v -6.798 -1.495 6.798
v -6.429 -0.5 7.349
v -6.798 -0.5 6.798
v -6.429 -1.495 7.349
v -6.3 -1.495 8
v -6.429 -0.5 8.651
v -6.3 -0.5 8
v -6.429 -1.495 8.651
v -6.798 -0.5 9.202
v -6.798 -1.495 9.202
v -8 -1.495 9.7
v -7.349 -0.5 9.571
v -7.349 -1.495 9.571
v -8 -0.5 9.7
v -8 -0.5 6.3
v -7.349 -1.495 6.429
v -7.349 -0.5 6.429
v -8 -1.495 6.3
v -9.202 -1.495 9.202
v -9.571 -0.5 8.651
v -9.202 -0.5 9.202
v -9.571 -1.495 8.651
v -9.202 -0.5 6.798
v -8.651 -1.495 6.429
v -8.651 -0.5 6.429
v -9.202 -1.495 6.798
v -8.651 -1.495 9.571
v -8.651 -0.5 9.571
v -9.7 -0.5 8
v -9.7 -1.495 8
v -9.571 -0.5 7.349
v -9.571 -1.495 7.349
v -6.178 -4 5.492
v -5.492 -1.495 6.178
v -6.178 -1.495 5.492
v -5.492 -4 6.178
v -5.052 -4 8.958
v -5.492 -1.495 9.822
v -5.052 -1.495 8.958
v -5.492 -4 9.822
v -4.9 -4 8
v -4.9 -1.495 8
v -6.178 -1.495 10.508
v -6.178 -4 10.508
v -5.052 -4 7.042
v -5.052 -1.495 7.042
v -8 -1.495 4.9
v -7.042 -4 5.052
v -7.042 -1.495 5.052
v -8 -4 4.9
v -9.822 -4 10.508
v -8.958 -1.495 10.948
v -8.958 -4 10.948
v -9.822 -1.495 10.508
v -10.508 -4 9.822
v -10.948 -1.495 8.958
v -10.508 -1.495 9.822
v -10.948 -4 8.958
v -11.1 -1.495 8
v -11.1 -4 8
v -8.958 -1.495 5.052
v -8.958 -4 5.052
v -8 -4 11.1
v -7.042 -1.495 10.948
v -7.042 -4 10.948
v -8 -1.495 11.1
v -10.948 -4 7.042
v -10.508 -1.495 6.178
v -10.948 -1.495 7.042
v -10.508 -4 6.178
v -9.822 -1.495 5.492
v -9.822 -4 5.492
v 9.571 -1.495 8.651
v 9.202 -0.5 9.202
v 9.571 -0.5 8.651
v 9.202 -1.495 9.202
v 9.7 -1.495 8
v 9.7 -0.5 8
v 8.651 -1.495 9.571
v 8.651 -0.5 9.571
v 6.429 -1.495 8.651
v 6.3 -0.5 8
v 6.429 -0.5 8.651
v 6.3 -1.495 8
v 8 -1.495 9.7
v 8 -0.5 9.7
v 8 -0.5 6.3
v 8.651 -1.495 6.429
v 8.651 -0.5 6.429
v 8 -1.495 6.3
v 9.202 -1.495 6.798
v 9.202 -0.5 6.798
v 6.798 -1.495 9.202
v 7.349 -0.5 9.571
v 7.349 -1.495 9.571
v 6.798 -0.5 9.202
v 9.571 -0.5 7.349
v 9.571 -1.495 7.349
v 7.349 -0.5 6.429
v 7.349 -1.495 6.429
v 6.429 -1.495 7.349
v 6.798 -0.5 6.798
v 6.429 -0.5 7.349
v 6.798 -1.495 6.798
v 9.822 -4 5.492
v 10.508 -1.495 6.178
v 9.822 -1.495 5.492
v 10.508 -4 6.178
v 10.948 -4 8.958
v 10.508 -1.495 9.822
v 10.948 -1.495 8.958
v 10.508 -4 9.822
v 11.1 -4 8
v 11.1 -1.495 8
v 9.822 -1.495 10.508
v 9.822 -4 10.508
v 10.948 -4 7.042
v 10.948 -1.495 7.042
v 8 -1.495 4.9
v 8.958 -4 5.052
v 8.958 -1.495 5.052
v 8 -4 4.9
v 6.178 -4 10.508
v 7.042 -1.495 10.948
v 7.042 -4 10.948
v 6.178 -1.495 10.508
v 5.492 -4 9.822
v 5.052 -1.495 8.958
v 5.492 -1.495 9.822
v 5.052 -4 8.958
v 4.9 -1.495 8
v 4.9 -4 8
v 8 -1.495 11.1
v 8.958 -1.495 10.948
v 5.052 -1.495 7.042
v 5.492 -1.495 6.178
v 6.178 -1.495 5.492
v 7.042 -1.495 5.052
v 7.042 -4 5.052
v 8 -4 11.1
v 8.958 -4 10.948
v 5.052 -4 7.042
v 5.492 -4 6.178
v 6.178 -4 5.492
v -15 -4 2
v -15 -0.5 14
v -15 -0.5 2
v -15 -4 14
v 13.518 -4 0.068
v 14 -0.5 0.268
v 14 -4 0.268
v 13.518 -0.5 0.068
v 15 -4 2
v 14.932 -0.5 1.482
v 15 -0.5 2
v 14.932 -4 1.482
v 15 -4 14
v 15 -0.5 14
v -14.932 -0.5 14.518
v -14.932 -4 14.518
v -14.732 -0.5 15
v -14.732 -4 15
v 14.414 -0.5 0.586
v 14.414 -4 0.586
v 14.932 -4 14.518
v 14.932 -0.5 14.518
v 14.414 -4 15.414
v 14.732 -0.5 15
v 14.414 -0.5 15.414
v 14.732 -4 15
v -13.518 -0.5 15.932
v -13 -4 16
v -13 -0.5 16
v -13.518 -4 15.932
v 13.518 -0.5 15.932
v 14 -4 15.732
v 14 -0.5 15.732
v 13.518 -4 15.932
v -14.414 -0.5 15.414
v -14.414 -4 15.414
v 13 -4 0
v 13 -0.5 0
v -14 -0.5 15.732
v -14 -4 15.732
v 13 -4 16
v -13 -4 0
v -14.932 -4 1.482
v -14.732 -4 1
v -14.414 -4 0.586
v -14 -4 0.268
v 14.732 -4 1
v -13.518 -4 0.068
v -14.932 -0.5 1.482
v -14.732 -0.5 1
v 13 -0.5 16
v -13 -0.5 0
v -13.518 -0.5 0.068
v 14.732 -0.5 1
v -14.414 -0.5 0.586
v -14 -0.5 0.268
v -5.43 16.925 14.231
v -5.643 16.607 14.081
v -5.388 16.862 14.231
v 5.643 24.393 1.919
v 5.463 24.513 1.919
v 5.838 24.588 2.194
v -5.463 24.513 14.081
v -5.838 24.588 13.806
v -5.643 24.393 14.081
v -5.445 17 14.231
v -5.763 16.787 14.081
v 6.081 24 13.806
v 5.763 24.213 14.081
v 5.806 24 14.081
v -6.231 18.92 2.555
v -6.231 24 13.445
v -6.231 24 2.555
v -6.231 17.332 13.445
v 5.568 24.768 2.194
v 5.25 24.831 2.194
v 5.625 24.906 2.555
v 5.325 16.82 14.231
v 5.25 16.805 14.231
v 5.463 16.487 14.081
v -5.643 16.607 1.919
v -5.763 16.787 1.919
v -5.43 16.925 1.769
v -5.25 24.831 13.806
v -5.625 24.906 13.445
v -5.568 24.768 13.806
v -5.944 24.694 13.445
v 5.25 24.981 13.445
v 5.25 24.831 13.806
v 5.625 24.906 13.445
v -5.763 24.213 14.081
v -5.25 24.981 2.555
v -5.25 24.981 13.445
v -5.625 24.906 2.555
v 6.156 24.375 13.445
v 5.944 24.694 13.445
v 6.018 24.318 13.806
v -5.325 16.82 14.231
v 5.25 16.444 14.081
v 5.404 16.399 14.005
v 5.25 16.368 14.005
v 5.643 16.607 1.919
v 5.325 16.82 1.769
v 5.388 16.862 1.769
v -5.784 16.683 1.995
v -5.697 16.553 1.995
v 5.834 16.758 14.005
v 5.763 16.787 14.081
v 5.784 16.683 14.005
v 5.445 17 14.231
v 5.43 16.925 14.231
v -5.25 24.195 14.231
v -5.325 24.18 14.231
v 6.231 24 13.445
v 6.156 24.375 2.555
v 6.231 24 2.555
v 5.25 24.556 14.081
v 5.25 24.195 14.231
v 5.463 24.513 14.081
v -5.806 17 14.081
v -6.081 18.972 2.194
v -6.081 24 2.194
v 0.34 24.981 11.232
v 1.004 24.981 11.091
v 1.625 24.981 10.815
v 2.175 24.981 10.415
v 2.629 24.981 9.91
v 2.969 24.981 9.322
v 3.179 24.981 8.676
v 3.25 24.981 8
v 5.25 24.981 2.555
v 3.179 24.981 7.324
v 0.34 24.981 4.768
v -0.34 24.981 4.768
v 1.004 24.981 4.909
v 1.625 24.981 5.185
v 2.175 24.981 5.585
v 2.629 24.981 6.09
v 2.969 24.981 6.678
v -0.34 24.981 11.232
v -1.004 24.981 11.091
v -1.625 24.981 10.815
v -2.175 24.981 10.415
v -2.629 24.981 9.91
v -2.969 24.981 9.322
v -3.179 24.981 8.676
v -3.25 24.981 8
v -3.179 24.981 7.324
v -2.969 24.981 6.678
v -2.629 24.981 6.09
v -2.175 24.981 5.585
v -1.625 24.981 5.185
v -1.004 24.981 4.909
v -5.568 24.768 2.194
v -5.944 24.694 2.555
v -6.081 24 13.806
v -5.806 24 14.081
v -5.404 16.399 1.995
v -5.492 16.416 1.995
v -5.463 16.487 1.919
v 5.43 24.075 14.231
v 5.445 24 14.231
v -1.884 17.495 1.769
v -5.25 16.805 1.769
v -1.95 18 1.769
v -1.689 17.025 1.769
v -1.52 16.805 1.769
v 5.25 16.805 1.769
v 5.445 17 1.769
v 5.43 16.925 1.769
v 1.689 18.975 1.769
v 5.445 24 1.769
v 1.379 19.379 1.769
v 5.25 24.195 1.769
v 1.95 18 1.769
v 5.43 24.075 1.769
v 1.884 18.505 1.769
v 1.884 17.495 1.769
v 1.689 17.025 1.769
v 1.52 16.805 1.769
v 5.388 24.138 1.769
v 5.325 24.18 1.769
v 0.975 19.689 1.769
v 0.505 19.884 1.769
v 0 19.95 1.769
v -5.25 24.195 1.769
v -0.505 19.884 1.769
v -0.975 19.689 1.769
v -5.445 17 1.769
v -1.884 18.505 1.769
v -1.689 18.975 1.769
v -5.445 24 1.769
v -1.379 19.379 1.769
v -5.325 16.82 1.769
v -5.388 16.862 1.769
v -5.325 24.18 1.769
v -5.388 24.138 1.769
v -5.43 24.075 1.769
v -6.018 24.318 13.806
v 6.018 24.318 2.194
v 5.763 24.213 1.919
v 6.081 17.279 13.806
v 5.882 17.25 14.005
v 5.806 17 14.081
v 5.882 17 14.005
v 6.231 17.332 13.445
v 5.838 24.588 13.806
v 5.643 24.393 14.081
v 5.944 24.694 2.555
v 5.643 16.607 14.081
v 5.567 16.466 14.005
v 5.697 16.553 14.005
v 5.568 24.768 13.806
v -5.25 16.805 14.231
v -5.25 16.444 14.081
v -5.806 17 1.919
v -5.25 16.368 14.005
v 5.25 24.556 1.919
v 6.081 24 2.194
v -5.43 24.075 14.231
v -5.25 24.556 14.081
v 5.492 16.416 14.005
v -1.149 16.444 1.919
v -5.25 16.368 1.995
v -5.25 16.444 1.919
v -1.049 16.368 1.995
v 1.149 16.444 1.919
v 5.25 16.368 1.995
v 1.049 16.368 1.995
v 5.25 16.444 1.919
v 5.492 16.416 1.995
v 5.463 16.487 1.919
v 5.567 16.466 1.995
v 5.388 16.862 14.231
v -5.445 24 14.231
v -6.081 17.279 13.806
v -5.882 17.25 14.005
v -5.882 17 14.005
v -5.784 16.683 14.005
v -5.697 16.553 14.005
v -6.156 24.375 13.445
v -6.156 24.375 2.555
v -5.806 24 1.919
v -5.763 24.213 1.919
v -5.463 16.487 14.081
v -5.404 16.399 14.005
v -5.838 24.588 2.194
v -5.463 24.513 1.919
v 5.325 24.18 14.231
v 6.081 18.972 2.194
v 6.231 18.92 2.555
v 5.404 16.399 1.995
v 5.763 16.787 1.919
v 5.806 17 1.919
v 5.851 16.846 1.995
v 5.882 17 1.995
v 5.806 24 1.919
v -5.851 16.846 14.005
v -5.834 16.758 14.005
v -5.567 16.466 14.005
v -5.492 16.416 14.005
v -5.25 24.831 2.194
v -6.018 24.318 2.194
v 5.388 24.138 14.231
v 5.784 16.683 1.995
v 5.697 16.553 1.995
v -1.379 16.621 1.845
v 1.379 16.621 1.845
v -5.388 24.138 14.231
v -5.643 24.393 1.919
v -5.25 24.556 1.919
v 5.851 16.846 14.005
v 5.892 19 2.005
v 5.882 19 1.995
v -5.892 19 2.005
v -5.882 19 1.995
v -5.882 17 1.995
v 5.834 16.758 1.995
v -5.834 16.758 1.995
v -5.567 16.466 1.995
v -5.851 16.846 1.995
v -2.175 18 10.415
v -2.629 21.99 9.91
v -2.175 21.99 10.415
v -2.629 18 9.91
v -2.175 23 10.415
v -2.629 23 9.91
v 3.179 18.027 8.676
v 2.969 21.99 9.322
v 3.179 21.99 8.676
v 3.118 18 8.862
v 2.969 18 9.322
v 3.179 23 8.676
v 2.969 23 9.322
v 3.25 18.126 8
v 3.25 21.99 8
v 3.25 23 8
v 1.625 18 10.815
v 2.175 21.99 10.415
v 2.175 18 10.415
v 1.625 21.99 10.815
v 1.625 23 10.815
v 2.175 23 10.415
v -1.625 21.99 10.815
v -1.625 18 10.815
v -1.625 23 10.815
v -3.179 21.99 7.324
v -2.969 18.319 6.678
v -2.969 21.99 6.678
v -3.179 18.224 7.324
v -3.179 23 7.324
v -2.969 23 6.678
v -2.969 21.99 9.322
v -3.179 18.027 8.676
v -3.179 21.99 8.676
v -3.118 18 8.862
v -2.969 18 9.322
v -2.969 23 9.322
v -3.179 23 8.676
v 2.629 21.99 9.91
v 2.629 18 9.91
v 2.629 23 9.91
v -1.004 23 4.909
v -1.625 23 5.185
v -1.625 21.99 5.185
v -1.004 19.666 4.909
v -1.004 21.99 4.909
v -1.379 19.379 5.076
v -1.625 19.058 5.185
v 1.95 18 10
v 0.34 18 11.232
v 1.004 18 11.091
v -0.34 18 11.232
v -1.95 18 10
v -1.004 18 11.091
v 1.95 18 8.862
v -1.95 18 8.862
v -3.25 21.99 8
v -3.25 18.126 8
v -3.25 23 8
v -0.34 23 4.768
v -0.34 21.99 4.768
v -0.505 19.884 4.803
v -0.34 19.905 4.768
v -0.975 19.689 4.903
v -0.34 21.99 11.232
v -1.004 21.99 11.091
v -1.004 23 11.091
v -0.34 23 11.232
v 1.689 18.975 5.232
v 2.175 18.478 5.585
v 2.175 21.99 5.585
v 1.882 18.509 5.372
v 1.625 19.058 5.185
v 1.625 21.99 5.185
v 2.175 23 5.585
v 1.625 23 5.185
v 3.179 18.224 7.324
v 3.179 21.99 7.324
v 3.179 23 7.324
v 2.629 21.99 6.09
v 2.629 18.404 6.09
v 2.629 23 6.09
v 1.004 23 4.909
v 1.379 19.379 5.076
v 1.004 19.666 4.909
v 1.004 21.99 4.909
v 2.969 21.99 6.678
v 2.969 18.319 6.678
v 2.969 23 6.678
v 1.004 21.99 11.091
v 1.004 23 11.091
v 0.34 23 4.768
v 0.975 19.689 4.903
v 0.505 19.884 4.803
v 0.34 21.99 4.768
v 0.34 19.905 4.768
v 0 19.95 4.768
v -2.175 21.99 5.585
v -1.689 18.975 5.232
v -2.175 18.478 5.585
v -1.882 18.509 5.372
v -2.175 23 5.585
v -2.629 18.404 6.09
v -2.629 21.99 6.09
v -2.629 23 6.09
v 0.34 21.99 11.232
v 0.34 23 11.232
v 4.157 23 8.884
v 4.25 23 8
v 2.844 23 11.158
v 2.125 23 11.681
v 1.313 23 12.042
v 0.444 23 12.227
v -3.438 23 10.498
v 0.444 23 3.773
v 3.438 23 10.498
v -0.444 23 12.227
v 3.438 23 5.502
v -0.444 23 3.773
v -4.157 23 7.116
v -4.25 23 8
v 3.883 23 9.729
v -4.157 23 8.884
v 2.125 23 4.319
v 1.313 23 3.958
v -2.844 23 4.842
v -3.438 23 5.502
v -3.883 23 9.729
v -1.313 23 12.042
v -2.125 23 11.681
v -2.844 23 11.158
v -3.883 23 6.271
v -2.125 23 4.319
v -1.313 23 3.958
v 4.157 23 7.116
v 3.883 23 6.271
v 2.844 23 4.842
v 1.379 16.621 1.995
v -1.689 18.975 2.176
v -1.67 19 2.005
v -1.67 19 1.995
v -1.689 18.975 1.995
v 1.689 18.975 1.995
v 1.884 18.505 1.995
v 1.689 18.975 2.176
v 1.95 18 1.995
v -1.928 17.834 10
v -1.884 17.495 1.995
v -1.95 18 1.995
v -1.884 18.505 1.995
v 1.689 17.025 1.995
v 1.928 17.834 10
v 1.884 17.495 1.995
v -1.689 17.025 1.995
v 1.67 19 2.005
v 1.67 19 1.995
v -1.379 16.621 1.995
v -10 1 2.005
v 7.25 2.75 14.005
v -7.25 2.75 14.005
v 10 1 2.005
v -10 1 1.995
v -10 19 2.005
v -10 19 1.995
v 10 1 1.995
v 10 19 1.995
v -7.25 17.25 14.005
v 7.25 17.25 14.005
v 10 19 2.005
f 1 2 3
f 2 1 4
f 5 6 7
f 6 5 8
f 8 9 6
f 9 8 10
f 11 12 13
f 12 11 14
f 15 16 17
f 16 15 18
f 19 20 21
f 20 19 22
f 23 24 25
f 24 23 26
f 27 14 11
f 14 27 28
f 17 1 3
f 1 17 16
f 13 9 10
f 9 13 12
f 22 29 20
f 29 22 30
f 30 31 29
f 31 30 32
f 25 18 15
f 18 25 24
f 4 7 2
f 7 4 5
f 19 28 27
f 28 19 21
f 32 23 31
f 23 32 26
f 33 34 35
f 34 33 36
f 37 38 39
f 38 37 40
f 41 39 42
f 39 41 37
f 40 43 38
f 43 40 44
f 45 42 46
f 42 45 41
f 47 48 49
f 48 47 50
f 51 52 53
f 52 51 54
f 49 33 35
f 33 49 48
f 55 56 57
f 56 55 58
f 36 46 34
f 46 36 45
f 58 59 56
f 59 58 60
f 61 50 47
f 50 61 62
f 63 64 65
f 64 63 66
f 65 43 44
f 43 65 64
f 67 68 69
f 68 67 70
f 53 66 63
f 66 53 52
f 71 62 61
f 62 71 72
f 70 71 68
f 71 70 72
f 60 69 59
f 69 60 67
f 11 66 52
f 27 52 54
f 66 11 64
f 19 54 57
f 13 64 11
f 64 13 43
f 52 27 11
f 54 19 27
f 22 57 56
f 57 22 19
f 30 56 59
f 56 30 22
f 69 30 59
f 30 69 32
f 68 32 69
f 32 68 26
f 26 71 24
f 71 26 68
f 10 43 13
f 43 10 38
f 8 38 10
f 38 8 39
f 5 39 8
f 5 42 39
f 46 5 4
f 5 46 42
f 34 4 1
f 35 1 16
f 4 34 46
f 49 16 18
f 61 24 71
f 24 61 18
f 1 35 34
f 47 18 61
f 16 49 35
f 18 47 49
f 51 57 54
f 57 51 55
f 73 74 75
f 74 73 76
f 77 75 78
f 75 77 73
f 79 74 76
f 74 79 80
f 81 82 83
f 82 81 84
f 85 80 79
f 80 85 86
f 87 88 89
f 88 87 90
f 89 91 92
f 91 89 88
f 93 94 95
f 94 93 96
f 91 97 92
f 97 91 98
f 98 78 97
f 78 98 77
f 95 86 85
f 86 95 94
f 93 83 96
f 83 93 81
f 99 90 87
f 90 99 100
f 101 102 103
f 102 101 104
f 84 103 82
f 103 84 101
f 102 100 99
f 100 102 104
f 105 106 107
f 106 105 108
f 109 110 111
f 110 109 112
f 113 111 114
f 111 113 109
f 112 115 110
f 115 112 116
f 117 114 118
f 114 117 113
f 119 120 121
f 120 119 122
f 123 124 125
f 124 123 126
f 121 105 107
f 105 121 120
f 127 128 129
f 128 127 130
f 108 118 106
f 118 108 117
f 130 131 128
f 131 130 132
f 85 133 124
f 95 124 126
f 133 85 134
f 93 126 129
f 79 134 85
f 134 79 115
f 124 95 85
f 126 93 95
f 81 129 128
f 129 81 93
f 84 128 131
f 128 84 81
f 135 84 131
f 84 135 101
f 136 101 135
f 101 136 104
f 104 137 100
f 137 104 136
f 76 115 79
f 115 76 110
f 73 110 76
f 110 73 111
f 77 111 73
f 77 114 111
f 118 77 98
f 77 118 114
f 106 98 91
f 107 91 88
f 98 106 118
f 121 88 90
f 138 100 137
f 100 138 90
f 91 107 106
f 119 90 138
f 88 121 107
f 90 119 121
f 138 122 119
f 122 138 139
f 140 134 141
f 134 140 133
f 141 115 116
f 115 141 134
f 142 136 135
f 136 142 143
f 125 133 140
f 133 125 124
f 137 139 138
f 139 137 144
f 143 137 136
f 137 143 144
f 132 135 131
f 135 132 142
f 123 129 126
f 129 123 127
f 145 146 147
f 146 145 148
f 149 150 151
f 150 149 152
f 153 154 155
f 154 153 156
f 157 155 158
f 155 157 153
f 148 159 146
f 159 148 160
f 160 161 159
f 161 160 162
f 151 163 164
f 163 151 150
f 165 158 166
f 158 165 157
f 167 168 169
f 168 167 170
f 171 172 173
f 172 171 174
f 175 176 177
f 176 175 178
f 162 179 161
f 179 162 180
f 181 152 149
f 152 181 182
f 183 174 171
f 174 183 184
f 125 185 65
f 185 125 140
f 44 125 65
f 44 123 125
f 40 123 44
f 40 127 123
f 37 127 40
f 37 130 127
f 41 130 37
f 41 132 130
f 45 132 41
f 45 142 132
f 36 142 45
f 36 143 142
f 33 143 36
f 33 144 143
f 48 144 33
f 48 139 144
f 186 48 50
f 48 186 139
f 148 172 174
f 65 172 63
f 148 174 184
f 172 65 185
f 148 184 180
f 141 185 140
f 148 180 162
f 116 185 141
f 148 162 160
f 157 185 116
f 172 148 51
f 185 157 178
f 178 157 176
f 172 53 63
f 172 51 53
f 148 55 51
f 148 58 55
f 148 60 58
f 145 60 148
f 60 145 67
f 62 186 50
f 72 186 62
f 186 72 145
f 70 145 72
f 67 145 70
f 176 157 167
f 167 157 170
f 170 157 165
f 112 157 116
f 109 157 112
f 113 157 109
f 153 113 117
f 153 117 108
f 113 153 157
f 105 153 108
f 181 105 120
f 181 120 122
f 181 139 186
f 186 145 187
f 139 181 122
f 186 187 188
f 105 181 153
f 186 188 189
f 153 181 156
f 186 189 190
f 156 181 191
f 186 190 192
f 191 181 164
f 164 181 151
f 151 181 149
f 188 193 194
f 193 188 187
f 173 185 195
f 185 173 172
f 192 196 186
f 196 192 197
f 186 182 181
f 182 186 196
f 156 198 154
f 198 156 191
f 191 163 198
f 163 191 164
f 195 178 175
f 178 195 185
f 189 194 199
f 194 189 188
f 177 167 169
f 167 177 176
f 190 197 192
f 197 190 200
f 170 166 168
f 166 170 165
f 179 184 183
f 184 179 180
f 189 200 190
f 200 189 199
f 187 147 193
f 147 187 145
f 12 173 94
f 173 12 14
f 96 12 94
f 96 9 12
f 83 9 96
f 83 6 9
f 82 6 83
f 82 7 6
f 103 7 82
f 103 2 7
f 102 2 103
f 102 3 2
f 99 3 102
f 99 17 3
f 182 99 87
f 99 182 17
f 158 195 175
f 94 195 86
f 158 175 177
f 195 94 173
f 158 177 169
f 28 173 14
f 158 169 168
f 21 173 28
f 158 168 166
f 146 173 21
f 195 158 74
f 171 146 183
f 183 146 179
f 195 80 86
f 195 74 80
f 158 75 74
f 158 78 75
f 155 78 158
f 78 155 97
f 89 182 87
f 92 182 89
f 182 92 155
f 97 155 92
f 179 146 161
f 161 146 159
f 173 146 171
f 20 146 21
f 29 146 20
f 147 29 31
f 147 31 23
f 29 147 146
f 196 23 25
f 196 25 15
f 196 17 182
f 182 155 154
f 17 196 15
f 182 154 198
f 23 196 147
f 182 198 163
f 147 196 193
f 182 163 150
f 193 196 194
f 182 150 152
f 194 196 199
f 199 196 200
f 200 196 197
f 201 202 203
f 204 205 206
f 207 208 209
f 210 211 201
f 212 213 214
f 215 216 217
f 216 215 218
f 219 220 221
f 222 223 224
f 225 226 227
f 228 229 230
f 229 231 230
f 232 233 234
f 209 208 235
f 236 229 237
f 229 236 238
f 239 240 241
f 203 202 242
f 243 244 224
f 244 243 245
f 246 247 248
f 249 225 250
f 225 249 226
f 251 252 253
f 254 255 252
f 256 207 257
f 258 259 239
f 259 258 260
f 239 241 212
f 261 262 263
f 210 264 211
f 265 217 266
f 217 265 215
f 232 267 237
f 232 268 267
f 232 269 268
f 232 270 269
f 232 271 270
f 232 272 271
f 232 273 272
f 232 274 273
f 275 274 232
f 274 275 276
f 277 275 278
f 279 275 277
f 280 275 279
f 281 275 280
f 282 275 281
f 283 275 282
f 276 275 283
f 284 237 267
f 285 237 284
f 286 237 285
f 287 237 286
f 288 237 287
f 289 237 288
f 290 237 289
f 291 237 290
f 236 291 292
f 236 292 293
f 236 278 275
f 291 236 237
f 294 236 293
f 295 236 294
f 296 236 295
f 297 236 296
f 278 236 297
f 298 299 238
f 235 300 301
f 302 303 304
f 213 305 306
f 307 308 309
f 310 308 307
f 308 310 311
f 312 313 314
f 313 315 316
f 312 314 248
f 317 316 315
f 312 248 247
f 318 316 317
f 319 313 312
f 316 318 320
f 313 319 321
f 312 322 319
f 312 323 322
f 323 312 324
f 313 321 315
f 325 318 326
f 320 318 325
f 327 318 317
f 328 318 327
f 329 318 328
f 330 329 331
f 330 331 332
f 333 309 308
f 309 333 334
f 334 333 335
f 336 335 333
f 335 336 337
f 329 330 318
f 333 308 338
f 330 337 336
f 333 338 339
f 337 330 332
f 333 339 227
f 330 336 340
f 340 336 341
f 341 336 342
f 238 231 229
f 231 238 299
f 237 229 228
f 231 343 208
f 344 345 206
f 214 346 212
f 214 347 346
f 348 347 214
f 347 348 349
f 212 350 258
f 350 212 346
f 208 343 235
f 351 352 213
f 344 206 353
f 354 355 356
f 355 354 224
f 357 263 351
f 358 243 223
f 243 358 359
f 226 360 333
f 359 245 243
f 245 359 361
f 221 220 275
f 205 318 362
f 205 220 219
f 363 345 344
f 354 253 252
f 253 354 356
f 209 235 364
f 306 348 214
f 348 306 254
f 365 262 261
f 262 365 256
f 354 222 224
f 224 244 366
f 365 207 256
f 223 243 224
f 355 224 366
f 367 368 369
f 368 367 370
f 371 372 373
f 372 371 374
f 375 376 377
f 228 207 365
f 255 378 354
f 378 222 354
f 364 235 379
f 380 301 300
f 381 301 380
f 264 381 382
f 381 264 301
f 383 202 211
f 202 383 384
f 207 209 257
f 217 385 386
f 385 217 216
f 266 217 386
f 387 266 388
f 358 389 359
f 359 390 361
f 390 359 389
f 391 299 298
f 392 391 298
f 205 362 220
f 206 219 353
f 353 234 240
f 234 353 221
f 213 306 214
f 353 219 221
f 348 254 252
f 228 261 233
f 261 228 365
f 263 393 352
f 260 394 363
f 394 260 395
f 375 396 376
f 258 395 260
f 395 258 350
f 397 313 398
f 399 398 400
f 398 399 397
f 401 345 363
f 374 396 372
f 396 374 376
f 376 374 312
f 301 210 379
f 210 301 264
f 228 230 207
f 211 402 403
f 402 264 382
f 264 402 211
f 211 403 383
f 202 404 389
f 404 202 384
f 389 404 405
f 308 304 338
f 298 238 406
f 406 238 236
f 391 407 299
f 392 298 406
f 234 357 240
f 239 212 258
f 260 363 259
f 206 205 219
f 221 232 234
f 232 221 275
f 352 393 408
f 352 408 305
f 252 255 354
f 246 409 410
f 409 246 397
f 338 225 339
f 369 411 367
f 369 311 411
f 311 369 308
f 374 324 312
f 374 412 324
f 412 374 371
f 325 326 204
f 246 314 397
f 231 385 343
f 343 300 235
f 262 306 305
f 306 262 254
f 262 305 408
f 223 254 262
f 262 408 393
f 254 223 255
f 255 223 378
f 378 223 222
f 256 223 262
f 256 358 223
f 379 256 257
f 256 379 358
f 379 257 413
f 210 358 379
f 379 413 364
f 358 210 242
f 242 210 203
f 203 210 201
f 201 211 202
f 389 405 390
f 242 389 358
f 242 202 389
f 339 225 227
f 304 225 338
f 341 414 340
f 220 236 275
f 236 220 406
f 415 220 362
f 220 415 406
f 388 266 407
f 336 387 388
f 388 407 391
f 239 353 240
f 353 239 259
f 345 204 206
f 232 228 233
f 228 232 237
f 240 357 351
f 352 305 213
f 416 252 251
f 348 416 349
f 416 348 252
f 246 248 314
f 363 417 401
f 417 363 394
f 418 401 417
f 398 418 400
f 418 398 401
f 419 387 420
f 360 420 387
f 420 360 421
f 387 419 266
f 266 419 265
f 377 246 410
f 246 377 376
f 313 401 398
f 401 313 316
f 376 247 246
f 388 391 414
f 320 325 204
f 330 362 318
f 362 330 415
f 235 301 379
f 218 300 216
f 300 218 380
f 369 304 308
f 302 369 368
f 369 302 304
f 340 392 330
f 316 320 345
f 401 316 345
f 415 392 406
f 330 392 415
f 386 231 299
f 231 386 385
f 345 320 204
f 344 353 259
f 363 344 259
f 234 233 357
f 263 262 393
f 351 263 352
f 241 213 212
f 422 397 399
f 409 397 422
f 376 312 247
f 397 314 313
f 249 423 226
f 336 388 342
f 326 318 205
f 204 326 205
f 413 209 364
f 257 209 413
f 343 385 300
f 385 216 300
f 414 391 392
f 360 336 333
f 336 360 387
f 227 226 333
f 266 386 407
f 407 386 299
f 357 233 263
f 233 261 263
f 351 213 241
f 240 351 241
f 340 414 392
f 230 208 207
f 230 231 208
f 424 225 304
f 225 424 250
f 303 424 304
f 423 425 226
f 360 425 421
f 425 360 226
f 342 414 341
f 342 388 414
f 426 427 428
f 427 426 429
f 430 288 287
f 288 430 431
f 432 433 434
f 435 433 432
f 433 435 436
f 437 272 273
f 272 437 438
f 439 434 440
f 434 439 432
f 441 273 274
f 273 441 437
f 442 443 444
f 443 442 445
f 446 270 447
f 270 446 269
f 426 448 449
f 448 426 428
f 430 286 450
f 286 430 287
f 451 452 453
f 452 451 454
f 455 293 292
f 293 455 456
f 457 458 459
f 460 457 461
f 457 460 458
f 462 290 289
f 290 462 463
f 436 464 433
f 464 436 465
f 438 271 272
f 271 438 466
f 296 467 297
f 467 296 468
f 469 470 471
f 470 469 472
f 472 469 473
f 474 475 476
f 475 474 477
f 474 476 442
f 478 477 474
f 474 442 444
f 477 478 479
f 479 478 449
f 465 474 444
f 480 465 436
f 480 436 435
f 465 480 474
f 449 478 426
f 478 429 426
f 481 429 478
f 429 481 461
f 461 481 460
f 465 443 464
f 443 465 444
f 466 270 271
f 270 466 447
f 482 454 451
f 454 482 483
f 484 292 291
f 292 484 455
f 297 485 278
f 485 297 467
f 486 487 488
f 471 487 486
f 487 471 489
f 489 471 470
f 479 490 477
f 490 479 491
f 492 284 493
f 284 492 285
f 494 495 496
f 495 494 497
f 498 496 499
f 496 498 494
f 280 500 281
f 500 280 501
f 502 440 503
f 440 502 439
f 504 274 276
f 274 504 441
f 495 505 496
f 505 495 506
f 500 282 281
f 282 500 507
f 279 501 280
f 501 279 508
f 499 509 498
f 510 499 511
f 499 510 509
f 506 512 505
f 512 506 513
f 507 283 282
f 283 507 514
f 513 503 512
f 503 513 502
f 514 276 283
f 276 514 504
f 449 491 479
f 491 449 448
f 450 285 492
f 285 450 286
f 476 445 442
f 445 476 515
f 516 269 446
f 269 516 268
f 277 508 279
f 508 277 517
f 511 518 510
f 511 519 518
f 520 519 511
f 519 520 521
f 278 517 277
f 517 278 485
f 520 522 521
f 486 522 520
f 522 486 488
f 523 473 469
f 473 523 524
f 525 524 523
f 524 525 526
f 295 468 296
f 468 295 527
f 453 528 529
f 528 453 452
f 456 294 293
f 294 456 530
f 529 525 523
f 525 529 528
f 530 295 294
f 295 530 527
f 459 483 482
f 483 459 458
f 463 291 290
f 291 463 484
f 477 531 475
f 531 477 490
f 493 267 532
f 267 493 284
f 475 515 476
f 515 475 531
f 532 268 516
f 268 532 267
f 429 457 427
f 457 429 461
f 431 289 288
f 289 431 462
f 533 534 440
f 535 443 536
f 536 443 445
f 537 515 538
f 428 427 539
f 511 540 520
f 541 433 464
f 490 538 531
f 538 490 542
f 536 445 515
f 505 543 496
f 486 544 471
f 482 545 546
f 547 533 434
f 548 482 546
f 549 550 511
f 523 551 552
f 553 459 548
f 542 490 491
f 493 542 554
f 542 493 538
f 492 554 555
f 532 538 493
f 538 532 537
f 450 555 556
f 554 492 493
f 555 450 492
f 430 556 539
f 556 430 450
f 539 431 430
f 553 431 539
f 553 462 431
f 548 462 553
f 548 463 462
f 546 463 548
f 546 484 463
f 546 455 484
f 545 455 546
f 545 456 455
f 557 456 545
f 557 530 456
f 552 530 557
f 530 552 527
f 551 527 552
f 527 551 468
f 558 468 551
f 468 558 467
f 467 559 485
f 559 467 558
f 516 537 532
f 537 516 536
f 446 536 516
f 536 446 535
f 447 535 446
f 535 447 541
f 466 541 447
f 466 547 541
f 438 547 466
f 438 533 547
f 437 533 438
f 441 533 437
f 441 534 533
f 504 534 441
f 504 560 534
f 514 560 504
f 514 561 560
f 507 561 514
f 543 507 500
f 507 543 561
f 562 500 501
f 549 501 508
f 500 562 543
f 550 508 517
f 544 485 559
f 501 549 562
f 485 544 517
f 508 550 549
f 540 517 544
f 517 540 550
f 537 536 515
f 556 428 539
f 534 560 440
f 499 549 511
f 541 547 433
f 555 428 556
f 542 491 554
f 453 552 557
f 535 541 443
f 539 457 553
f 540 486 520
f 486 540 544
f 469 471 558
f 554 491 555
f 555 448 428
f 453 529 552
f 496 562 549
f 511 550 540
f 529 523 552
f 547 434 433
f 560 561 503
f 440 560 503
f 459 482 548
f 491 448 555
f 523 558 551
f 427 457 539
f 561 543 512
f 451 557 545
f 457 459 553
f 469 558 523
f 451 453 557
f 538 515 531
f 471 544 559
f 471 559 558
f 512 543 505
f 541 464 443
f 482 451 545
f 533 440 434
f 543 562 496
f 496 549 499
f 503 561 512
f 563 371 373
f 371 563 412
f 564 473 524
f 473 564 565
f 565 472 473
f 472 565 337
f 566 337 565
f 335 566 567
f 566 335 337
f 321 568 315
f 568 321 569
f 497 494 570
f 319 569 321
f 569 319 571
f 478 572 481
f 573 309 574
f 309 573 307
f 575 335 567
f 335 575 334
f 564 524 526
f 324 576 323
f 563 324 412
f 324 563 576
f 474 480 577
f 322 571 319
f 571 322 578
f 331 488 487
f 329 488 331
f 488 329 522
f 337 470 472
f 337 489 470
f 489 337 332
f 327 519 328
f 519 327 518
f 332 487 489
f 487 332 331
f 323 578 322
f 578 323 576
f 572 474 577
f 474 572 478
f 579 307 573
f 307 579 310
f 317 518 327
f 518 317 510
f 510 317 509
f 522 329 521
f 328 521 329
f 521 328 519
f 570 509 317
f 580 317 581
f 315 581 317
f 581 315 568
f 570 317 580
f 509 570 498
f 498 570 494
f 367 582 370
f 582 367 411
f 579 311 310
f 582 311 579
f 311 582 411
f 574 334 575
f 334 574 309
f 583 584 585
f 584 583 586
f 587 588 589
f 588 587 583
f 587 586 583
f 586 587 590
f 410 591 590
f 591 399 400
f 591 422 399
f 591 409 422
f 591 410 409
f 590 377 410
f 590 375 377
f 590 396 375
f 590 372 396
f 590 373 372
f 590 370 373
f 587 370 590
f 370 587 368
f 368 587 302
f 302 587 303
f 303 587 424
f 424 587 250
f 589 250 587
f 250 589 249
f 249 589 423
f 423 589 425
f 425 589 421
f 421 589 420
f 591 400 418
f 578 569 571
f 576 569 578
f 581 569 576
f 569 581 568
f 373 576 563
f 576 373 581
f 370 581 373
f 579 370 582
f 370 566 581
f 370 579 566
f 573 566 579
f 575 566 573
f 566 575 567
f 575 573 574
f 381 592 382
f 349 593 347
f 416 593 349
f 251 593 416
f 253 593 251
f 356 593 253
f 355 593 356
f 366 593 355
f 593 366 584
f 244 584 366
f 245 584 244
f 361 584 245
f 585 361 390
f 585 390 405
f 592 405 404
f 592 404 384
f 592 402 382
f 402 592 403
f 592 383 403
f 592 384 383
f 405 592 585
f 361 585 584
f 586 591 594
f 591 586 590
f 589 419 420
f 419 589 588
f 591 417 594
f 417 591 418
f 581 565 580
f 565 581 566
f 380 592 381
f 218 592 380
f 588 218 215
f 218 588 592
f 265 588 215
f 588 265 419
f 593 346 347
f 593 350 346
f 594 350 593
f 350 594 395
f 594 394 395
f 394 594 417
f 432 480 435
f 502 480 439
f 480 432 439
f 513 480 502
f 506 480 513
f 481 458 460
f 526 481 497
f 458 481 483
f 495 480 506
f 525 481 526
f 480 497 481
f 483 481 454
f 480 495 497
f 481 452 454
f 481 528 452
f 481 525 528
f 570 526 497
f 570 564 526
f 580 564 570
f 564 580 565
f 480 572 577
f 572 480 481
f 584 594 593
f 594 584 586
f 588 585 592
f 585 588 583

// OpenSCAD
// ============================================================
//  TPU Doctor Blade Holder — Luer Lock Blunt Tip (18G)
//  For: Rister Toolchanger / printed electronics BIPV fab
//  Material: TPU 85A–95A, 0.4 mm nozzle recommended
//  Author: HTS Resources LLC
// ============================================================
//
//  OVERVIEW
//  --------
//  This tool holds an 18G (or similar) Luer Lock blunt tip and
//  carries a flexible TPU doctor blade immediately behind the
//  nozzle exit. The blade spreads dispensed ink into a thin,
//  uniform film on the substrate. Z-height of the printer
//  toolhead controls the working gap (target 100–300 µm).
//
//  The body is split into three functional zones:
//    1. MOUNT PLATE  — attaches to tool head via M3 screws
//    2. BODY BRIDGE  — connects mount to nozzle collar; adds
//                      lateral stiffness while TPU stays flexible
//    3. NOZZLE COLLAR — snug friction fit for Luer Lock hub
//    4. BLADE WING   — thin tapered blade, 30 mm wide, flexible
//
//  PRINT SETTINGS (TPU 85A–95A)
//    - Layer height: 0.15–0.2 mm
//    - Perimeters: 3–4 walls
//    - Infill: 20–30% gyroid
//    - Print slow: 20–25 mm/s for TPU
//    - No supports needed if printed in orientation shown
//    - Orient flat (mount plate face-down on bed)
// ============================================================

/* ── GLOBAL PARAMETERS ── */

// Luer Lock hub outer diameter (18G Treela tip hub ≈ 6.5 mm)
// Increase slightly (e.g. 6.6) for tighter friction fit in TPU
luer_od = 6.5;          // mm — hub OD to grip
luer_depth = 7.0;       // mm — depth of collar socket
collar_wall = 2.0;      // mm — wall thickness around Luer hub
// Tip of collar has a chamfer to guide the Luer hub in
collar_chamfer = 1.0;   // mm

/* ── BLADE PARAMETERS ── */

blade_width     = 30.0; // mm — spreading width of doctor blade
blade_root_t    = 2.5;  // mm — thickness at blade root (stiff)
blade_tip_t     = 0.7;  // mm — thickness at blade edge (flexible)
blade_length    = 14.0; // mm — how far blade extends from nozzle CL
// The blade tapers linearly from root to tip in thickness
// blade_tip_t should be at or below 1 layer × number-of-walls
// for maximum flexibility at the spreading edge

/* ── BODY / BRIDGE PARAMETERS ── */

body_width  = 20.0;  // mm — width of central body (X)
body_depth  = 12.0;  // mm — depth front-to-back (Y)
body_height = 18.0;  // mm — height from mount plate to nozzle CL

/* ── MOUNT PLATE PARAMETERS ── */

mount_w   = 30.0;   // mm — total mount plate width
mount_h   = 16.0;   // mm — total mount plate height (Z axis)
mount_t   =  4.0;   // mm — plate thickness (Y axis, into tool head)
// M3 hole positions — measured from plate centre
m3_spacing_x = 16.0; // mm — horizontal distance between M3 holes
m3_spacing_z =  0.0; // mm — vertical offset (0 = same height)
m3_dia       =  3.4; // mm — M3 clearance hole (3.4 for TPU compression)
m3_head_dia  =  6.2; // mm — M3 countersink / washer recess diameter
m3_head_depth=  2.5; // mm — depth of washer recess

/* ── NOZZLE ALIGNMENT ── */

// Distance from front face of mount plate to nozzle CL (Y)
nozzle_reach   = body_depth + mount_t;
// Height of nozzle centre above bottom of mount plate (Z)
// Adjust this so the blade tip grazes the substrate at the
// desired Z=0 home when mount plate top is at tool head datum
nozzle_z_above_bottom = 8.0; // mm

/* ── DERIVED / CONVENIENCE ── */

collar_od  = luer_od + 2 * collar_wall;  // outer dia of collar
eps        = 0.01; // small epsilon for clean boolean diffs

// ============================================================
//  MODULES
// ============================================================

// --- 1. MOUNT PLATE -------------------------------------------
// Flat plate with M3 clearance holes and washer recesses.
// Attach this face to your tool head carriage.
module mount_plate() {
    difference() {
        // Main plate body — slightly radiused corners via minkowski
        minkowski() {
            cube([mount_w - 4, mount_h - 4, mount_t - 1], center=true);
            cylinder(r=2, h=0.5, $fn=24);
        }
        // Two M3 clearance holes
        for (dx = [-m3_spacing_x/2, m3_spacing_x/2]) {
            translate([dx, 0, m3_spacing_z]) {
                // Through hole
                cylinder(d=m3_dia, h=mount_t + eps*2, center=true, $fn=16);
                // Washer recess on back face
                translate([0, 0, (mount_t - m3_head_depth)/2])
                    cylinder(d=m3_head_dia, h=m3_head_depth + eps,
                             center=true, $fn=20);
            }
        }
    }
}

// --- 2. BODY BRIDGE -------------------------------------------
// Connects mount plate to nozzle collar.
// Rounded rectangular cross-section for stiffness + printability.
module body_bridge() {
    hull() {
        // At mount plate face
        translate([0, -body_depth/2, 0])
            cube([body_width, eps, body_height], center=true);
        // At nozzle collar face — narrower to blend into collar
        translate([0, body_depth/2, 0])
            cube([collar_od + 4, eps, collar_od + 4], center=true);
    }
}

// --- 3. NOZZLE COLLAR -----------------------------------------
// Cylindrical socket that accepts the Luer Lock hub.
// The front opening is chamfered to guide insertion.
// Inner diameter matches luer_od for a snug friction fit in TPU.
module nozzle_collar() {
    difference() {
        cylinder(d=collar_od, h=luer_depth, $fn=36);
        // Central bore for Luer hub
        translate([0, 0, collar_chamfer])
            cylinder(d=luer_od, h=luer_depth + eps, $fn=30);
        // Entry chamfer — makes it easy to push hub in
        translate([0, 0, -eps])
            cylinder(d1=luer_od + 2*collar_chamfer,
                     d2=luer_od,
                     h=collar_chamfer + eps, $fn=30);
    }
    // Hex grip ring around collar body (optional tactile feature)
    // Uncomment if you want a wrench-grip surface:
    // translate([0,0,luer_depth/2])
    //   rotate([0,0,0]) cylinder(d=collar_od+1, h=3, $fn=6, center=true);
}

// --- 4. DOCTOR BLADE ------------------------------------------
// Wide, thin blade that tapers from root_t to tip_t.
// Centred on X; positioned so root begins at nozzle CL (Y=0).
// The blade extends in the +Y direction (trailing behind nozzle
// as the head moves in -Y, i.e. blade drags the ink).
//
// TIP: For 85A TPU at blade_tip_t=0.7 mm, the edge is very
// flexible. Increase to 1.0 mm for stiffer 95A TPU.
module doctor_blade() {
    // Use a polyhedron for the tapered cross-section
    // Width = X, length = Y, thickness = Z (matches print orientation)
    w  = blade_width;
    l  = blade_length;
    rt = blade_root_t;
    tt = blade_tip_t;

    // 8-point polyhedron: trapezoidal cross-section (thicker at root)
    polyhedron(
        points = [
            // Root face (Y=0) — full thickness
            [-w/2,  0,  0],   // 0
            [ w/2,  0,  0],   // 1
            [ w/2,  0,  rt],  // 2
            [-w/2,  0,  rt],  // 3
            // Tip face (Y=+l) — thin edge, centred in Z at blade_root_t/2
            [-w/2,  l,  (rt-tt)/2],       // 4
            [ w/2,  l,  (rt-tt)/2],       // 5
            [ w/2,  l,  (rt-tt)/2 + tt],  // 6
            [-w/2,  l,  (rt-tt)/2 + tt],  // 7
        ],
        faces = [
            // All faces wound counter-clockwise when viewed from outside
            [3,2,1,0],   // root face (facing -Y)
            [4,5,6,7],   // tip face  (facing +Y)
            [3,7,4,0],   // left side  (facing -X)
            [0,4,5,1],   // bottom     (facing -Z)
            [1,5,6,2],   // right side (facing +X)
            [2,6,7,3],   // top        (facing +Z)
        ]
    );
}

// ============================================================
//  ASSEMBLY
// ============================================================
// Coordinate system:
//   X = left/right  (blade width direction)
//   Y = front/back  (travel direction; blade trails in +Y)
//   Z = up/down     (substrate gap direction; nozzle exits in -Z)
//
// Mount plate: back face at Y=0, extends in -Y into tool head.
// Nozzle collar: bore runs in Z, hub inserts from +Y (front face).
//   The nozzle tip exits downward (-Z) toward the substrate.
// Blade: root begins at nozzle CL (Y = nozzle_y), extends in +Y.
//   Blade edge in Z sits at substrate level; gap set by z_offset.
//
//  ┌──────────────────────────────────────┐
//  │  [mount plate]──[bridge]──[collar]   │  ← side view
//  │                             │        │
//  │                            ▼ nozzle  │
//  │                    [blade ══════════>│  trailing edge
//  └──────────────────────────────────────┘
//                       substrate ────────

// Y position of nozzle centreline (front face of bridge + collar radius)
nozzle_y = mount_t + body_depth;

module assembly() {
    // ----- MOUNT PLATE -----
    // Plate XZ plane, centred in X and Z, back face at Y=0
    translate([0, -mount_t/2, mount_h/2])
        rotate([90, 0, 0])
            mount_plate();

    // ----- BODY BRIDGE -----
    // Fills the gap between mount plate front face and collar
    translate([0, mount_t + body_depth/2, nozzle_z_above_bottom])
        rotate([90, 0, 0])
            body_bridge();

    // ----- NOZZLE COLLAR -----
    // Hub inserts from +Y (front face); nozzle exits downward (-Z).
    #translate([0, nozzle_y, nozzle_z_above_bottom])
        nozzle_collar_horizontal();

    // ----- DOCTOR BLADE -----
    // Root starts at nozzle_y (just behind nozzle exit).
    // Blade extends in +Y (trailing direction).
    // Z offset puts blade edge at substrate level.
    blade_z_offset = nozzle_z_above_bottom - blade_root_t;
    translate([0, nozzle_y, blade_z_offset])
    #    doctor_blade();
}

// Collar variant with bore running in Z and hub entry from +Y.
// The Luer hub slides in horizontally from the front; the nozzle
// tip points straight down toward the substrate.
module nozzle_collar_horizontal() {
    // Body: short cylinder in Z, wide enough to embed the luer socket
    // We embed the luer bore horizontally (Y axis) inside a block.
    cw = collar_od + 2;          // collar block width (X)
    ch = collar_od + 2;          // collar block height (Z)
    cd = luer_depth + collar_wall; // collar block depth (Y)

    difference() {
        // Rounded rectangular block
        translate([0, cd/2, 0])
            minkowski() {
                cube([cw-2, cd-2, ch-2], center=true);
                sphere(r=1, $fn=16);
            }

        // Luer hub bore — runs in Y (hub enters from +Y front face)
        translate([0, cd + eps, 0])
            rotate([90, 0, 0])
                cylinder(d=luer_od, h=luer_depth + eps, $fn=30);

        // Entry chamfer at front face (+Y)
        translate([0, luer_depth, 0])
            rotate([90, 0, 0])
                cylinder(d1=luer_od + 2*collar_chamfer, d2=luer_od,
                         h=collar_chamfer + eps, $fn=30);

        // Nozzle exit bore — runs in -Z (down toward substrate)
        // Positioned at the end of the luer hub bore
        translate([0, collar_wall, -ch/2 - eps])
            cylinder(d=luer_od * 0.6, h=ch/2 + collar_wall + eps, $fn=24);
    }
}

// ============================================================
//  RENDER
// ============================================================

assembly();


// ============================================================
//  NOTES FOR TUNING
// ============================================================
//
//  WORKING GAP (100–300 µm):
//    Set your slicer Z-offset or Klipper z_offset so that the
//    blade edge clears the substrate by the desired gap.
//    At blade_tip_t = 0.7 mm (3 walls × 0.25 mm), the edge
//    will flex and self-level somewhat on the substrate.
//
//  FRICTION FIT TUNING:
//    If Luer hub is loose: reduce luer_od by 0.1–0.2 mm.
//    If Luer hub won't insert: increase luer_od by 0.1 mm.
//    TPU will grip well; you may need to wiggle the hub in.
//
//  BLADE STIFFNESS:
//    85A TPU + blade_tip_t = 0.7 mm → very flexible, self-levels
//    95A TPU + blade_tip_t = 1.0 mm → stiffer, more consistent gap
//
//  BLADE WIDTH vs SUBSTRATE:
//    blade_width = 30 mm is suitable for ~1" (25 mm) substrates.
//    Increase to 40–50 mm for 2"×2" glass tiles.
//
//  M3 HOLE SPACING:
//    m3_spacing_x = 16 mm matches common toolchanger carriage
//    plate patterns. Adjust to match your specific mount pattern.
//
// ============================================================
